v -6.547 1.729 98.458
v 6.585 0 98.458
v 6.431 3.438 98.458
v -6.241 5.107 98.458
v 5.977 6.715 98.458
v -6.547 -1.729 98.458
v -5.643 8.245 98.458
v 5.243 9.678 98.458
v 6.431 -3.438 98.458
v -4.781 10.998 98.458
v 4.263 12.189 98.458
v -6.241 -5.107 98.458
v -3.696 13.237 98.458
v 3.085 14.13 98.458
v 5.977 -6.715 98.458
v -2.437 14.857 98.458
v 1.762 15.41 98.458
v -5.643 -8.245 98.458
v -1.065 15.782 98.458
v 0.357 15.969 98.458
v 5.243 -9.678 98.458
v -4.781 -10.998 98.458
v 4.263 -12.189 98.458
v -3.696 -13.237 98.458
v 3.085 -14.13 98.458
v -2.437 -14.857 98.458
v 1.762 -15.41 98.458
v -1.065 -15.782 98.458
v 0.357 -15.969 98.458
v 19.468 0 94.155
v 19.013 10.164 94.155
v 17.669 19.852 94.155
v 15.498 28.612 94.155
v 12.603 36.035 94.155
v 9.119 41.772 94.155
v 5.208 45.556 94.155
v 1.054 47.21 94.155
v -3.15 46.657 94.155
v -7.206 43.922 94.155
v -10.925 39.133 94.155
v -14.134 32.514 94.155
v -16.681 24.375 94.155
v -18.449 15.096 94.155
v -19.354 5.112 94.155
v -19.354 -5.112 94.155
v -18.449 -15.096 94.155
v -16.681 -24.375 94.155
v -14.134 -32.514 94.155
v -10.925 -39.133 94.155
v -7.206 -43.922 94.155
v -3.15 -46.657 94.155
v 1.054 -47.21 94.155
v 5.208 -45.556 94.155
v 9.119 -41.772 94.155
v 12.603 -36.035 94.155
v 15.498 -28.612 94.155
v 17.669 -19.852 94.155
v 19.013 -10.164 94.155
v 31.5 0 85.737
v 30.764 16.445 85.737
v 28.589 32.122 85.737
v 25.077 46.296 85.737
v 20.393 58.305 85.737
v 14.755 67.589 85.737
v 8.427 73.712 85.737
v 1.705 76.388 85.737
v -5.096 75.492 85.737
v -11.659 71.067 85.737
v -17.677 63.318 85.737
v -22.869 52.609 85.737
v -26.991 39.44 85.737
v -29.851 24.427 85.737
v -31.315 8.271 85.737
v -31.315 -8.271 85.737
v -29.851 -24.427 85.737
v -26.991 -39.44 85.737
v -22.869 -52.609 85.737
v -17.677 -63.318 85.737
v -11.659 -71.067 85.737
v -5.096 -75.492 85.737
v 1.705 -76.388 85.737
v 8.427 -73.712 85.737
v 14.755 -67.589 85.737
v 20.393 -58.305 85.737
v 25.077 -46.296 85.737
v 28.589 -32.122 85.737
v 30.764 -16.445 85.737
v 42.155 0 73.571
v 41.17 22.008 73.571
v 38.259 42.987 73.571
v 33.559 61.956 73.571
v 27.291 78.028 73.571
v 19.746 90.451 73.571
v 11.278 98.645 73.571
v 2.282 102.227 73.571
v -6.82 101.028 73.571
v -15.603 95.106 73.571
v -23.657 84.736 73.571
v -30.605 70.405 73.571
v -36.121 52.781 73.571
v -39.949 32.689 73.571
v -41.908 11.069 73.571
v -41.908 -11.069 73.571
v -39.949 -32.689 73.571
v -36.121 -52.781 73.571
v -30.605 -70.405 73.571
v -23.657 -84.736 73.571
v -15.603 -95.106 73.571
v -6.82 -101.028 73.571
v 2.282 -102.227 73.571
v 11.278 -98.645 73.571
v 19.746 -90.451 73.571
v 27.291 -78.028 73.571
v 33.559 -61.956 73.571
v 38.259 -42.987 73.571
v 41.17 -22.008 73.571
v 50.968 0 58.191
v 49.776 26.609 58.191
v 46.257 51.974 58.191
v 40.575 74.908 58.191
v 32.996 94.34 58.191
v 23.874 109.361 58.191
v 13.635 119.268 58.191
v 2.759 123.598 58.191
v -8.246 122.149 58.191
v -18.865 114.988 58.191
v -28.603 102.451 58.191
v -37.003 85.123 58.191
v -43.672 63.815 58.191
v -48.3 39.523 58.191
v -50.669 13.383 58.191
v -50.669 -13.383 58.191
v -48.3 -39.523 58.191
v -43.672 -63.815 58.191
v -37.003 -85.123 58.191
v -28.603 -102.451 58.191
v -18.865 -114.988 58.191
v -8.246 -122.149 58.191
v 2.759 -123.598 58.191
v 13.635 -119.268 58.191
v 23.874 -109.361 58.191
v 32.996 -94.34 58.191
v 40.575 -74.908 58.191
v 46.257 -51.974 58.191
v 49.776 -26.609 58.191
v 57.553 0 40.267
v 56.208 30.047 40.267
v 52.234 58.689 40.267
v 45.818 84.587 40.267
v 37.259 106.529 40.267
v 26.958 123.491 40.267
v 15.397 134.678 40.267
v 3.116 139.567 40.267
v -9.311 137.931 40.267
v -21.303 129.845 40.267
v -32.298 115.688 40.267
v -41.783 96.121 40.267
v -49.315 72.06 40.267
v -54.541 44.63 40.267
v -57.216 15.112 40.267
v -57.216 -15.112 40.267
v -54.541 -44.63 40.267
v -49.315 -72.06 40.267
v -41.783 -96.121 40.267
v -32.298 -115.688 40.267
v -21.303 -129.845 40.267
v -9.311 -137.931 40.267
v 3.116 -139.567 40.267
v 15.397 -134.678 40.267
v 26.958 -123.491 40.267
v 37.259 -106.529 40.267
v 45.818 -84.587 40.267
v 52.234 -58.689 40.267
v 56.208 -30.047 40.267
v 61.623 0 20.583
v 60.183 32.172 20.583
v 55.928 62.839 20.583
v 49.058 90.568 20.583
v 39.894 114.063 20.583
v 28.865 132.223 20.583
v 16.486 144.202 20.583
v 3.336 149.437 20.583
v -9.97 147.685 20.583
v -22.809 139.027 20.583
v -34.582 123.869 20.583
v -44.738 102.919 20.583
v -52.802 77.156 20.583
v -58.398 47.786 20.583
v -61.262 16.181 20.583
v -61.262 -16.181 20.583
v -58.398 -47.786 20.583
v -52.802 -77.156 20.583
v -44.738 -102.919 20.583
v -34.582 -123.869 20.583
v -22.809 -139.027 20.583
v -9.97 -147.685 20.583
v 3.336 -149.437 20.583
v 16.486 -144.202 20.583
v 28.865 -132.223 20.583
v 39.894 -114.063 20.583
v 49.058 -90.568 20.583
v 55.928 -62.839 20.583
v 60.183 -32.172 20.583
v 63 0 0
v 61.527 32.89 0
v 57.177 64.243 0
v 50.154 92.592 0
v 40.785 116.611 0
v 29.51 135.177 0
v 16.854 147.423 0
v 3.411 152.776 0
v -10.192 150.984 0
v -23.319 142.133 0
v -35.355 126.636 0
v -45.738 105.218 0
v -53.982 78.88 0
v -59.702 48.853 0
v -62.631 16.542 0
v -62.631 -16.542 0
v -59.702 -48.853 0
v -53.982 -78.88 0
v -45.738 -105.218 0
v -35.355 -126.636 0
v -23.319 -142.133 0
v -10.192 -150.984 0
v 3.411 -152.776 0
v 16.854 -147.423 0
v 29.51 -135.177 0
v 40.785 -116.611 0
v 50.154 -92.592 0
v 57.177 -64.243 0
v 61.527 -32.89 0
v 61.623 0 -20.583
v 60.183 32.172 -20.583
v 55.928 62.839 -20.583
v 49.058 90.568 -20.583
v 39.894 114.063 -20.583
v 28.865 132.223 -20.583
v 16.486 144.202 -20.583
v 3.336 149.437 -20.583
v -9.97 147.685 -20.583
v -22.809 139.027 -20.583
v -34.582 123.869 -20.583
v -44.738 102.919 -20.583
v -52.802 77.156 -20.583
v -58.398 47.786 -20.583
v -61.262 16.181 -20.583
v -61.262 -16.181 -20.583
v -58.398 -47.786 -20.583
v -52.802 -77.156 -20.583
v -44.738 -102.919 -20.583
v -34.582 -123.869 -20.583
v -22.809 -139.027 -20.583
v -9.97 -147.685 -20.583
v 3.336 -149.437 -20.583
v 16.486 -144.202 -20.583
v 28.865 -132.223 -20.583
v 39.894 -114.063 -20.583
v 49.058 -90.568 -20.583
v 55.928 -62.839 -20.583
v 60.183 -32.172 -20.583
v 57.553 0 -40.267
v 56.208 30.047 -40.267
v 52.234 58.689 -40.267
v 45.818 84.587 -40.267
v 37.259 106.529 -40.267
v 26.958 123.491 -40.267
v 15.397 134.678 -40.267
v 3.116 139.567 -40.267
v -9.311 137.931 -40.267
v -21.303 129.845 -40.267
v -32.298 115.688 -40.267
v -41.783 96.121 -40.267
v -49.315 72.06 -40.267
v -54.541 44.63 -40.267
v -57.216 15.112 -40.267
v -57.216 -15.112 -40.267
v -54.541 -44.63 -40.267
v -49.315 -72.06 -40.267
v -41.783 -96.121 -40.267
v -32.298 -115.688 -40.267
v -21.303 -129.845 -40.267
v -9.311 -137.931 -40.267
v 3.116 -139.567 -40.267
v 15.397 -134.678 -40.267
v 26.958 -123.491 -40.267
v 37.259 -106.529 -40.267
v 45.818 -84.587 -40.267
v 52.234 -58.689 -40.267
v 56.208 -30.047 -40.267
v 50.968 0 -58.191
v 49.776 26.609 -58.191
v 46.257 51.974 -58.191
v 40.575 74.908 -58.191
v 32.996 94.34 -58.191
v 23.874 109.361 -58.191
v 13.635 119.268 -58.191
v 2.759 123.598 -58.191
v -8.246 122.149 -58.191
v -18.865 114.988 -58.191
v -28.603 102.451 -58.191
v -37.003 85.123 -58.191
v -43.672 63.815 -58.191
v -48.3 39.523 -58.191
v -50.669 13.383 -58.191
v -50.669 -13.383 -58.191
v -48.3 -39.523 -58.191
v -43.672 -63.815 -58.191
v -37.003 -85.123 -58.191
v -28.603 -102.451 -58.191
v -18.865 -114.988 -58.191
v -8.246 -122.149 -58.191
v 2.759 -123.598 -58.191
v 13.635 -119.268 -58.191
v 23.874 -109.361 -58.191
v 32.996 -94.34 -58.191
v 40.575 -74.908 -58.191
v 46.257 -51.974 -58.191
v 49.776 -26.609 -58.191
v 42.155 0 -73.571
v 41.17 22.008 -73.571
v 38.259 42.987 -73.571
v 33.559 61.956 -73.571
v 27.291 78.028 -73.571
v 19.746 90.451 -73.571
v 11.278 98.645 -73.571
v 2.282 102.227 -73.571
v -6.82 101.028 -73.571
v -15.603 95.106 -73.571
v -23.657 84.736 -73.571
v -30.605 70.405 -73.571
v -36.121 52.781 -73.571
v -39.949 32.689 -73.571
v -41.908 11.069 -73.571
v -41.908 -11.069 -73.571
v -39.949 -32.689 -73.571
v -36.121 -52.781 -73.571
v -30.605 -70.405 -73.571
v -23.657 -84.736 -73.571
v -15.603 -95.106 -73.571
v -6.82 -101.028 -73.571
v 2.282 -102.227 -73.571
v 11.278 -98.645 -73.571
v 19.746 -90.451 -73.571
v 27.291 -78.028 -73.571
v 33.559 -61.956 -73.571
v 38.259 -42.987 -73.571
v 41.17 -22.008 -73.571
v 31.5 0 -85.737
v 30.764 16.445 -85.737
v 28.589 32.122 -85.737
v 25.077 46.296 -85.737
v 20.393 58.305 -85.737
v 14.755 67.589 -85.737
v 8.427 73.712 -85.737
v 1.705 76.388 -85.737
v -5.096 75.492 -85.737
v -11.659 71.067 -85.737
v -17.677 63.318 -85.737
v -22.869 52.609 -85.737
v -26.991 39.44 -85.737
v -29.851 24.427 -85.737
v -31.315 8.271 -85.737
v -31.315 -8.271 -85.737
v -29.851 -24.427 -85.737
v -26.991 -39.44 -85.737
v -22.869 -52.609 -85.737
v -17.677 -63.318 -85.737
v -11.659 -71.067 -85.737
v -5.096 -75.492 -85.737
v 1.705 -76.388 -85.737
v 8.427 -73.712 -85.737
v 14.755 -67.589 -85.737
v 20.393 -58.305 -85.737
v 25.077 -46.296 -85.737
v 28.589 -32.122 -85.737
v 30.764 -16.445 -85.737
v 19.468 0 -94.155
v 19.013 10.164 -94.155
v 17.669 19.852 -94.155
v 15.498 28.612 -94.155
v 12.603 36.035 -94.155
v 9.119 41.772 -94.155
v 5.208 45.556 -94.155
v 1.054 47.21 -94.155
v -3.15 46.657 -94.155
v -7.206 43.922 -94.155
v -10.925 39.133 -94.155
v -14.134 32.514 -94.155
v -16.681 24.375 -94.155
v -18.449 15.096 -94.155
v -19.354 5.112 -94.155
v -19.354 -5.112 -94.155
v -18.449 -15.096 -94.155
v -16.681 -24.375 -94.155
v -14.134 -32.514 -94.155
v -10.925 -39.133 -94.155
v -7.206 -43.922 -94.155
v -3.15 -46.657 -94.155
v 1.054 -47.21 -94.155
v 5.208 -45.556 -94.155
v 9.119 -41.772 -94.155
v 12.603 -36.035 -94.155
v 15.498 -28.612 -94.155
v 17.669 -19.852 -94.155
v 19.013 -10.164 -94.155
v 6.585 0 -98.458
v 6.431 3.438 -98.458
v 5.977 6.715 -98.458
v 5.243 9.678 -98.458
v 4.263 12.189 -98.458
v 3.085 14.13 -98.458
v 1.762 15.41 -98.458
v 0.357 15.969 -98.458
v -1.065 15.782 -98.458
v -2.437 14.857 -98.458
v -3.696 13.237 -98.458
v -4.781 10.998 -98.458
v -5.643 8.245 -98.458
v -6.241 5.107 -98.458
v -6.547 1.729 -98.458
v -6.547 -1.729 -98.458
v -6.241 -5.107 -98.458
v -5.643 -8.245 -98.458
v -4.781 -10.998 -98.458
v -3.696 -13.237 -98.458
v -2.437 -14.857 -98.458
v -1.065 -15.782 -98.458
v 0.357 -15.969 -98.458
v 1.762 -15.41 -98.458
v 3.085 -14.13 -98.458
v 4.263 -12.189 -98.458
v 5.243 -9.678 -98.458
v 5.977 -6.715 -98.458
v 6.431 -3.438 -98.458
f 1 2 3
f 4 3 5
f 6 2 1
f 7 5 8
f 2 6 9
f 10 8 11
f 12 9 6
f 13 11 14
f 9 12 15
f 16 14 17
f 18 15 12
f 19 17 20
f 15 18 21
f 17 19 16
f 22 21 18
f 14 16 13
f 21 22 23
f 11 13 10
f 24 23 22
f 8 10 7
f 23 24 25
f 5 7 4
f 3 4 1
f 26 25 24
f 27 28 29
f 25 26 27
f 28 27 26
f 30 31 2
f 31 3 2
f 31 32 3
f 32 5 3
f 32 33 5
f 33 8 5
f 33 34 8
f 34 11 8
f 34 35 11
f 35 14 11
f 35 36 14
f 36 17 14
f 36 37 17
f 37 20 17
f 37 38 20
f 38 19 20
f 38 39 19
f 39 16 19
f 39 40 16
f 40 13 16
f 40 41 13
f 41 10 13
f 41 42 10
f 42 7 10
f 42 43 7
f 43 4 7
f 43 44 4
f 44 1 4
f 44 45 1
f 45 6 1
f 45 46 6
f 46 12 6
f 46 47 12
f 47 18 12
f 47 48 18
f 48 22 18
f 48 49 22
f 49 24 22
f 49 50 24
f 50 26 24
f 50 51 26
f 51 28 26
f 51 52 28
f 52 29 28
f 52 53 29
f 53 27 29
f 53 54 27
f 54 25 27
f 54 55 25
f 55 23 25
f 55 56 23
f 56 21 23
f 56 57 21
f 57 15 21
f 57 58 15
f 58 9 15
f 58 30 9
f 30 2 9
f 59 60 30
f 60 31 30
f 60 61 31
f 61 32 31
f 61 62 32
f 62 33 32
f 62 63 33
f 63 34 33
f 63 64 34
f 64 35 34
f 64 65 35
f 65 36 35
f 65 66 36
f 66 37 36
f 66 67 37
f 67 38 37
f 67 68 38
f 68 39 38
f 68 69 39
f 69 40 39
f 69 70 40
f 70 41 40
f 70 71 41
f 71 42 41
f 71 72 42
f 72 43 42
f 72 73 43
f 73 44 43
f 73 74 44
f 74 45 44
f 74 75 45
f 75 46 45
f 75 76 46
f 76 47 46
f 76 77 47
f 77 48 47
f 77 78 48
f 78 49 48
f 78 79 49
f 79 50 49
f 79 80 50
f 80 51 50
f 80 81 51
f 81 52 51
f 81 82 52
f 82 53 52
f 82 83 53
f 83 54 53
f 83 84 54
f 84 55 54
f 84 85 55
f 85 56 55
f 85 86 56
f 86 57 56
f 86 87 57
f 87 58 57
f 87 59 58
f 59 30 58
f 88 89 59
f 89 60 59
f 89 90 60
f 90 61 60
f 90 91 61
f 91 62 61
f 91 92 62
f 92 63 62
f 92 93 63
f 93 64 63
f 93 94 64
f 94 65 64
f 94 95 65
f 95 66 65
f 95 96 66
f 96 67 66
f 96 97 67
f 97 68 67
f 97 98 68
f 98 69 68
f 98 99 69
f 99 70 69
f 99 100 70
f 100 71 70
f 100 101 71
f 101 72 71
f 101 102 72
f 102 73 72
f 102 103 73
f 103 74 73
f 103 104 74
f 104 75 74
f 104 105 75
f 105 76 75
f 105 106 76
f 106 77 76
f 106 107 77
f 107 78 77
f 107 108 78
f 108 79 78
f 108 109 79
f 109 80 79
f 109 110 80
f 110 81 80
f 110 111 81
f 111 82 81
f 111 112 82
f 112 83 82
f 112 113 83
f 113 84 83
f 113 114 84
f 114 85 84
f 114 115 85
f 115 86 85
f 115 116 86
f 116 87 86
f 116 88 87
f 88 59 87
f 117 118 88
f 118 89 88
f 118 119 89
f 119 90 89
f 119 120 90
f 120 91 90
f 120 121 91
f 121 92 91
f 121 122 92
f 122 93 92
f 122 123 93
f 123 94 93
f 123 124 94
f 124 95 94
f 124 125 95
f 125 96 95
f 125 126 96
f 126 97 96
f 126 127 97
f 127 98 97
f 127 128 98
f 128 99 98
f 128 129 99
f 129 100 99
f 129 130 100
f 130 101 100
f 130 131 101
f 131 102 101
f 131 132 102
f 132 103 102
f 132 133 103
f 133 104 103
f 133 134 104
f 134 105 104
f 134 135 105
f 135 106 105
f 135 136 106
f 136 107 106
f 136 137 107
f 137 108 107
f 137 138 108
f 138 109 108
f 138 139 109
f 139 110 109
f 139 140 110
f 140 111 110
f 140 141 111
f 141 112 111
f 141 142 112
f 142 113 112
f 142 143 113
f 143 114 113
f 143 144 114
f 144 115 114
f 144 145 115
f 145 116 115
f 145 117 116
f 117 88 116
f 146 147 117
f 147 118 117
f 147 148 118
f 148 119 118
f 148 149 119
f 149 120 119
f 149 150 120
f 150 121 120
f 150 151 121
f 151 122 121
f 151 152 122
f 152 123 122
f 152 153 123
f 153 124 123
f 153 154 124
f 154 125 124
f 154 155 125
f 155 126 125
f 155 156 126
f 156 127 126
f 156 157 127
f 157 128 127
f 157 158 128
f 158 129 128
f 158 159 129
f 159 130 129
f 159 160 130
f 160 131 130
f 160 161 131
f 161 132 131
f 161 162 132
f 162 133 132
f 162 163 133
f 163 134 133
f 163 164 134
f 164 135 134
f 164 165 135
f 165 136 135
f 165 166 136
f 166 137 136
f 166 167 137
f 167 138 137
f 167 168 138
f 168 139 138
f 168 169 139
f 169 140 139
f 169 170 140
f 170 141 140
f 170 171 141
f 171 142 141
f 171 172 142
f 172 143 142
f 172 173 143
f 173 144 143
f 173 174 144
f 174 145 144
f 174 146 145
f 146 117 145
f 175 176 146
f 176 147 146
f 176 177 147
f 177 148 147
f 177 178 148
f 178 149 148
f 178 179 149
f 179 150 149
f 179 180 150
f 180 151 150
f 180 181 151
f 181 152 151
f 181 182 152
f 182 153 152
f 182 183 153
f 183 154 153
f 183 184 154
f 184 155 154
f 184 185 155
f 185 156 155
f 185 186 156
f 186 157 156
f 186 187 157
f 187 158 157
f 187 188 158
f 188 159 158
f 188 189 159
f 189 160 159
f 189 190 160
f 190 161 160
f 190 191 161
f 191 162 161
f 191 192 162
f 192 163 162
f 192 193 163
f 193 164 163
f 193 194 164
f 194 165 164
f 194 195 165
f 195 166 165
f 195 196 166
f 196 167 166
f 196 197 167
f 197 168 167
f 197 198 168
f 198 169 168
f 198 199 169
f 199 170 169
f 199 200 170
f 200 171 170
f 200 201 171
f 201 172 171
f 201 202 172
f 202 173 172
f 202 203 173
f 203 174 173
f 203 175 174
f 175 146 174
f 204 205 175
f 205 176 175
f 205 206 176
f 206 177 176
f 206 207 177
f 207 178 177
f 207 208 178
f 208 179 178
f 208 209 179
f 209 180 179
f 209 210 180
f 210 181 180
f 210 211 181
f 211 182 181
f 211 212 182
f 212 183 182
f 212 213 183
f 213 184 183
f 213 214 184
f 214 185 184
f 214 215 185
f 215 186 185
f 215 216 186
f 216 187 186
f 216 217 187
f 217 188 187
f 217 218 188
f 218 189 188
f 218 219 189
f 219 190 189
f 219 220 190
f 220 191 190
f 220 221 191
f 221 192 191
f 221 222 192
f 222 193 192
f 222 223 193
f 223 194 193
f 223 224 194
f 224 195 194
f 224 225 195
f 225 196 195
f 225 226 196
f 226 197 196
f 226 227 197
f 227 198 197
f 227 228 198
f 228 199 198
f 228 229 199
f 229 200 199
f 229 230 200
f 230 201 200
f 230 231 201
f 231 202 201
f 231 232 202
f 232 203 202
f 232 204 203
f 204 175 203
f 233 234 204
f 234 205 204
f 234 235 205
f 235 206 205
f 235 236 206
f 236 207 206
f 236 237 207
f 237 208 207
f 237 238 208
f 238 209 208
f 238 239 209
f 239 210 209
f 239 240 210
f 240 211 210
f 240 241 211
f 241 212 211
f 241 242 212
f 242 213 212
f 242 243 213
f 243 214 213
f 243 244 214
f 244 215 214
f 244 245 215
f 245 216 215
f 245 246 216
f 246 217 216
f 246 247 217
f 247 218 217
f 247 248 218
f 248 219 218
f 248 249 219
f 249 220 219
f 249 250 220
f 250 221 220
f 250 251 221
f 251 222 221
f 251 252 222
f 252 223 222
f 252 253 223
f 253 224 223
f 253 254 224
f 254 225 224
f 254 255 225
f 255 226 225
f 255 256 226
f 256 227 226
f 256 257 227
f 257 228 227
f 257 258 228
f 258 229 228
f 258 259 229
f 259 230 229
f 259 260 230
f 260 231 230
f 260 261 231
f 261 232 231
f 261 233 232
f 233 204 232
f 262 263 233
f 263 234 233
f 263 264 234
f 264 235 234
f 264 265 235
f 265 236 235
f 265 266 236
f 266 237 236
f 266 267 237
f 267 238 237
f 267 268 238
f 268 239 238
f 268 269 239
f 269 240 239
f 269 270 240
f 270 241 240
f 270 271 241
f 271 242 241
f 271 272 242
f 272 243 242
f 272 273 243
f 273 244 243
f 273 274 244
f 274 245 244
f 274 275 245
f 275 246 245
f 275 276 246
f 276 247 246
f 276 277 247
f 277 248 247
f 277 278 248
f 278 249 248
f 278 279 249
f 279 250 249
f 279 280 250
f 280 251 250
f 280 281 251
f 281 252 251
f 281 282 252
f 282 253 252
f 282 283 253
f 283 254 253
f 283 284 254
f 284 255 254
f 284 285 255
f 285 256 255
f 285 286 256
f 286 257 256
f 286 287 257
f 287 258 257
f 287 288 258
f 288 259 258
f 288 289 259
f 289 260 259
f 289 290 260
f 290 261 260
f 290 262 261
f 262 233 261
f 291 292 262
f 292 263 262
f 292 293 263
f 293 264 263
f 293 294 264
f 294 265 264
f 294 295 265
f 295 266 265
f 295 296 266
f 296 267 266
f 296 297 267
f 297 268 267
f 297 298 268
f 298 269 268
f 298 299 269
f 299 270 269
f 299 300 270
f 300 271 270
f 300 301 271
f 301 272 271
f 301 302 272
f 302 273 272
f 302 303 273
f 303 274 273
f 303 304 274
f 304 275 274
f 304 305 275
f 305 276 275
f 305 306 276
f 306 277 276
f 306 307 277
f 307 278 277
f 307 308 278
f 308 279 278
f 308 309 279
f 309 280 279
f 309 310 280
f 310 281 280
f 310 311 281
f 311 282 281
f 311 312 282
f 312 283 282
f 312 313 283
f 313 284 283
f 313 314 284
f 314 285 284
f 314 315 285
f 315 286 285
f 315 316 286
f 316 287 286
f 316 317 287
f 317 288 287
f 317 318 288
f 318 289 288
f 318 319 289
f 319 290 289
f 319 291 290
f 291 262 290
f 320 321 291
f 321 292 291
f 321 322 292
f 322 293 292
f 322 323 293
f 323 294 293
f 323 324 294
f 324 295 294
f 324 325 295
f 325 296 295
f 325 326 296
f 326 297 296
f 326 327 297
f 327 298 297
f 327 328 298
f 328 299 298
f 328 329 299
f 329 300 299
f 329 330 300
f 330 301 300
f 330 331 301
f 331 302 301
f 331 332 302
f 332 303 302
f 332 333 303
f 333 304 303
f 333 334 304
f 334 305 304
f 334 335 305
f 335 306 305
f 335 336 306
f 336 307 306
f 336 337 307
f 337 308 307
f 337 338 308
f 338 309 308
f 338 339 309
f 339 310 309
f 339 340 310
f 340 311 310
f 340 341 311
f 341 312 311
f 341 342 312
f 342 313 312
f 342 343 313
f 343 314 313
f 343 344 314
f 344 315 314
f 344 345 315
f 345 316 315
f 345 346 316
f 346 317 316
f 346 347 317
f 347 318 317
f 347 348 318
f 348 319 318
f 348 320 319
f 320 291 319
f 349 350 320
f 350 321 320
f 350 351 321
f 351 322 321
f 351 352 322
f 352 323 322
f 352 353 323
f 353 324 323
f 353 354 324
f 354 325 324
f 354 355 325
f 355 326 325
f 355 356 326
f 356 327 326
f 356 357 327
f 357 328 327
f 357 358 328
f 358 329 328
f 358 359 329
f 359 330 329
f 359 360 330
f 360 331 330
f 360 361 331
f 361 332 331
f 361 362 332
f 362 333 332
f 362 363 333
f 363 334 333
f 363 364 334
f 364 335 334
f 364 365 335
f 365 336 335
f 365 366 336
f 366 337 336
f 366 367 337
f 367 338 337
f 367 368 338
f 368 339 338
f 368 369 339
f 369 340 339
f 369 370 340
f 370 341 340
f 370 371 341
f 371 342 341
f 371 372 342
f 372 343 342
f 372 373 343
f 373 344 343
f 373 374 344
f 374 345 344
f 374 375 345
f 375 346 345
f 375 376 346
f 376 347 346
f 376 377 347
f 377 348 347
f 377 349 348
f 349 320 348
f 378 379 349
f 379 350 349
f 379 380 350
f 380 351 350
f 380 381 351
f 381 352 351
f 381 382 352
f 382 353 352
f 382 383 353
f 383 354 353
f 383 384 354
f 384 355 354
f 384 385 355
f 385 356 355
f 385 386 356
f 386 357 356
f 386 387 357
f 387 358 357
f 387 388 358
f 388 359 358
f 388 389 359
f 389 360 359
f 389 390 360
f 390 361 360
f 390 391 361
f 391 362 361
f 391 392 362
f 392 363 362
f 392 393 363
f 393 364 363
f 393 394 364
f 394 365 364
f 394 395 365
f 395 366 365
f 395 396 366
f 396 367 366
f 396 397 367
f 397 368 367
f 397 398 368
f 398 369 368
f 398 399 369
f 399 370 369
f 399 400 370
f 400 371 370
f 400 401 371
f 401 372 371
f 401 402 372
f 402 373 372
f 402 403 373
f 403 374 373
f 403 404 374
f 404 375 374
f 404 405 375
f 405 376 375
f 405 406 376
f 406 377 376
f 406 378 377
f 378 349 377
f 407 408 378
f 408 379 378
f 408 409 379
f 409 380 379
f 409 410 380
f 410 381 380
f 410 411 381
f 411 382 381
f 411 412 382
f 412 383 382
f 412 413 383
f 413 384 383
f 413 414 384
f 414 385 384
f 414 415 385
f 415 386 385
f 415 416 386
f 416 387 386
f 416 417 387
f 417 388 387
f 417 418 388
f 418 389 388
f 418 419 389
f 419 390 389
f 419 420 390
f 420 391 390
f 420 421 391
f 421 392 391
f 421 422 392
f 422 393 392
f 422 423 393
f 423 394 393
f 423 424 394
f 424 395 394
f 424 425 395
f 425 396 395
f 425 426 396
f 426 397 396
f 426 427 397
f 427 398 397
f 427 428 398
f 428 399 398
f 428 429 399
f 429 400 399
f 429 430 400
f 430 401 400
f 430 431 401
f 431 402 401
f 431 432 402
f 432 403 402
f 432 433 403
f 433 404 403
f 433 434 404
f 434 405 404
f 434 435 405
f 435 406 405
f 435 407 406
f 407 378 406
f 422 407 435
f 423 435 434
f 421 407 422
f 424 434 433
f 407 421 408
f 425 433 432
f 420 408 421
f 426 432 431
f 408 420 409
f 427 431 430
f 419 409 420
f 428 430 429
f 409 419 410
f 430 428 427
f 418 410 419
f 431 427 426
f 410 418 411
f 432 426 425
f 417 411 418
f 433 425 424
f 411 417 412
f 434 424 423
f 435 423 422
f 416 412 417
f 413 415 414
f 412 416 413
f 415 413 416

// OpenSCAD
// Generated by SolidPython 1.0.1 on 2020-07-29 00:46:48


scale(v = [7, 17, 11]) {
	sphere(r = 9);
}
/***********************************************
*********      SolidPython code:      **********
************************************************
 
# import packages: SolidPython
from solid import *
from solid.utils import *
from itertools import chain, combinations, permutations


class Resize:

    def __init__(self, scad_file):
        self.scad_file = scad_file
        #self.scad_file = import_scad(scad_file)
        # cone/cylinder param:
        self.r1 = 0
        self.r2 = 0
        self.h = 0
        # rectangular prism param:
        self.w = 0
        self.l = 0
        # ellipse param:
        self.r = 0

    # import OpenScad code (file name corresponds to shape)


    # classify shape + parameters
    def assign(self, param1, param2, param3):
        if self.scad_file == 'cone.scad':
            self.r1 = param1
            self.r2 = param2
            self.h = param3
        elif self.scad_file == 'cylinder.scad':
            self.r1 = param1
            self.r2 = param2
            self.h = param3
        elif self.scad_file == 'rectangularPrism.scad':
            self.h = param1
            self.l = param2
            self.w = param3
        else:
            self.r = param1
            self.h = param2

    # resize parameters
    def iterate(self):
        x = range(3, 20, 2)
        i = 1
        if self.scad_file == 'cone.scad':
            tempList = list(permutations(x, 2))
            for temp in tempList:
                param1 = temp[0]
                param2 = temp[1]
                filepath = 'produced_scad_files/' + 'cone' + str(param1) + '_' + str(param2) + '_' + '.scad'
                scad_render_to_file(cylinder(h=param1, r1=param2, r2=0), filepath)

        elif self.scad_file == 'cylinder.scad':
            tempList = list(permutations(x, 3))
            for temp in tempList:
                param1 = temp[0]
                param2 = temp[1]
                filepath = 'produced_scad_files/' + 'cylinder' + str(param1) + '_' + str(param2) + '_' + '.scad'
                scad_render_to_file(cylinder(h=param1, r1=param2, r2=param2), filepath)

        elif self.scad_file == 'rectangularPrism.scad':
            tempList = list(permutations(x, 3))
            for temp in tempList:
                param1 = temp[0]
                param2 = temp[1]
                param3 = temp[2]
                filepath = 'produced_scad_files/' + 'rectangularPrism' + str(param1) + '_' + str(param2) + '_' + str(
                    param3) + '.scad'
                scad_render_to_file(cube(size=(param1, param2, param3)), filepath)

        elif self.scad_file == 'ellipse.scad':
            tempList = list(permutations(x, 4))
            for temp in tempList:
                param1 = temp[0]
                param2 = temp[1]
                param3 = temp[2]
                param4 = temp[3]
                filepath = 'produced_scad_files/' + 'ellipse' + str(param1) + '_' + str(param2) + '_' + str(param3) + '_' + str(param4) + '.scad'
                scad_render_to_file(scale([param1, param2, param3])(sphere(r=param4)), filepath)

    def render_to_scadfile(self):
        scad_render_to_file(scad, 'example.scad') 
 
************************************************/
